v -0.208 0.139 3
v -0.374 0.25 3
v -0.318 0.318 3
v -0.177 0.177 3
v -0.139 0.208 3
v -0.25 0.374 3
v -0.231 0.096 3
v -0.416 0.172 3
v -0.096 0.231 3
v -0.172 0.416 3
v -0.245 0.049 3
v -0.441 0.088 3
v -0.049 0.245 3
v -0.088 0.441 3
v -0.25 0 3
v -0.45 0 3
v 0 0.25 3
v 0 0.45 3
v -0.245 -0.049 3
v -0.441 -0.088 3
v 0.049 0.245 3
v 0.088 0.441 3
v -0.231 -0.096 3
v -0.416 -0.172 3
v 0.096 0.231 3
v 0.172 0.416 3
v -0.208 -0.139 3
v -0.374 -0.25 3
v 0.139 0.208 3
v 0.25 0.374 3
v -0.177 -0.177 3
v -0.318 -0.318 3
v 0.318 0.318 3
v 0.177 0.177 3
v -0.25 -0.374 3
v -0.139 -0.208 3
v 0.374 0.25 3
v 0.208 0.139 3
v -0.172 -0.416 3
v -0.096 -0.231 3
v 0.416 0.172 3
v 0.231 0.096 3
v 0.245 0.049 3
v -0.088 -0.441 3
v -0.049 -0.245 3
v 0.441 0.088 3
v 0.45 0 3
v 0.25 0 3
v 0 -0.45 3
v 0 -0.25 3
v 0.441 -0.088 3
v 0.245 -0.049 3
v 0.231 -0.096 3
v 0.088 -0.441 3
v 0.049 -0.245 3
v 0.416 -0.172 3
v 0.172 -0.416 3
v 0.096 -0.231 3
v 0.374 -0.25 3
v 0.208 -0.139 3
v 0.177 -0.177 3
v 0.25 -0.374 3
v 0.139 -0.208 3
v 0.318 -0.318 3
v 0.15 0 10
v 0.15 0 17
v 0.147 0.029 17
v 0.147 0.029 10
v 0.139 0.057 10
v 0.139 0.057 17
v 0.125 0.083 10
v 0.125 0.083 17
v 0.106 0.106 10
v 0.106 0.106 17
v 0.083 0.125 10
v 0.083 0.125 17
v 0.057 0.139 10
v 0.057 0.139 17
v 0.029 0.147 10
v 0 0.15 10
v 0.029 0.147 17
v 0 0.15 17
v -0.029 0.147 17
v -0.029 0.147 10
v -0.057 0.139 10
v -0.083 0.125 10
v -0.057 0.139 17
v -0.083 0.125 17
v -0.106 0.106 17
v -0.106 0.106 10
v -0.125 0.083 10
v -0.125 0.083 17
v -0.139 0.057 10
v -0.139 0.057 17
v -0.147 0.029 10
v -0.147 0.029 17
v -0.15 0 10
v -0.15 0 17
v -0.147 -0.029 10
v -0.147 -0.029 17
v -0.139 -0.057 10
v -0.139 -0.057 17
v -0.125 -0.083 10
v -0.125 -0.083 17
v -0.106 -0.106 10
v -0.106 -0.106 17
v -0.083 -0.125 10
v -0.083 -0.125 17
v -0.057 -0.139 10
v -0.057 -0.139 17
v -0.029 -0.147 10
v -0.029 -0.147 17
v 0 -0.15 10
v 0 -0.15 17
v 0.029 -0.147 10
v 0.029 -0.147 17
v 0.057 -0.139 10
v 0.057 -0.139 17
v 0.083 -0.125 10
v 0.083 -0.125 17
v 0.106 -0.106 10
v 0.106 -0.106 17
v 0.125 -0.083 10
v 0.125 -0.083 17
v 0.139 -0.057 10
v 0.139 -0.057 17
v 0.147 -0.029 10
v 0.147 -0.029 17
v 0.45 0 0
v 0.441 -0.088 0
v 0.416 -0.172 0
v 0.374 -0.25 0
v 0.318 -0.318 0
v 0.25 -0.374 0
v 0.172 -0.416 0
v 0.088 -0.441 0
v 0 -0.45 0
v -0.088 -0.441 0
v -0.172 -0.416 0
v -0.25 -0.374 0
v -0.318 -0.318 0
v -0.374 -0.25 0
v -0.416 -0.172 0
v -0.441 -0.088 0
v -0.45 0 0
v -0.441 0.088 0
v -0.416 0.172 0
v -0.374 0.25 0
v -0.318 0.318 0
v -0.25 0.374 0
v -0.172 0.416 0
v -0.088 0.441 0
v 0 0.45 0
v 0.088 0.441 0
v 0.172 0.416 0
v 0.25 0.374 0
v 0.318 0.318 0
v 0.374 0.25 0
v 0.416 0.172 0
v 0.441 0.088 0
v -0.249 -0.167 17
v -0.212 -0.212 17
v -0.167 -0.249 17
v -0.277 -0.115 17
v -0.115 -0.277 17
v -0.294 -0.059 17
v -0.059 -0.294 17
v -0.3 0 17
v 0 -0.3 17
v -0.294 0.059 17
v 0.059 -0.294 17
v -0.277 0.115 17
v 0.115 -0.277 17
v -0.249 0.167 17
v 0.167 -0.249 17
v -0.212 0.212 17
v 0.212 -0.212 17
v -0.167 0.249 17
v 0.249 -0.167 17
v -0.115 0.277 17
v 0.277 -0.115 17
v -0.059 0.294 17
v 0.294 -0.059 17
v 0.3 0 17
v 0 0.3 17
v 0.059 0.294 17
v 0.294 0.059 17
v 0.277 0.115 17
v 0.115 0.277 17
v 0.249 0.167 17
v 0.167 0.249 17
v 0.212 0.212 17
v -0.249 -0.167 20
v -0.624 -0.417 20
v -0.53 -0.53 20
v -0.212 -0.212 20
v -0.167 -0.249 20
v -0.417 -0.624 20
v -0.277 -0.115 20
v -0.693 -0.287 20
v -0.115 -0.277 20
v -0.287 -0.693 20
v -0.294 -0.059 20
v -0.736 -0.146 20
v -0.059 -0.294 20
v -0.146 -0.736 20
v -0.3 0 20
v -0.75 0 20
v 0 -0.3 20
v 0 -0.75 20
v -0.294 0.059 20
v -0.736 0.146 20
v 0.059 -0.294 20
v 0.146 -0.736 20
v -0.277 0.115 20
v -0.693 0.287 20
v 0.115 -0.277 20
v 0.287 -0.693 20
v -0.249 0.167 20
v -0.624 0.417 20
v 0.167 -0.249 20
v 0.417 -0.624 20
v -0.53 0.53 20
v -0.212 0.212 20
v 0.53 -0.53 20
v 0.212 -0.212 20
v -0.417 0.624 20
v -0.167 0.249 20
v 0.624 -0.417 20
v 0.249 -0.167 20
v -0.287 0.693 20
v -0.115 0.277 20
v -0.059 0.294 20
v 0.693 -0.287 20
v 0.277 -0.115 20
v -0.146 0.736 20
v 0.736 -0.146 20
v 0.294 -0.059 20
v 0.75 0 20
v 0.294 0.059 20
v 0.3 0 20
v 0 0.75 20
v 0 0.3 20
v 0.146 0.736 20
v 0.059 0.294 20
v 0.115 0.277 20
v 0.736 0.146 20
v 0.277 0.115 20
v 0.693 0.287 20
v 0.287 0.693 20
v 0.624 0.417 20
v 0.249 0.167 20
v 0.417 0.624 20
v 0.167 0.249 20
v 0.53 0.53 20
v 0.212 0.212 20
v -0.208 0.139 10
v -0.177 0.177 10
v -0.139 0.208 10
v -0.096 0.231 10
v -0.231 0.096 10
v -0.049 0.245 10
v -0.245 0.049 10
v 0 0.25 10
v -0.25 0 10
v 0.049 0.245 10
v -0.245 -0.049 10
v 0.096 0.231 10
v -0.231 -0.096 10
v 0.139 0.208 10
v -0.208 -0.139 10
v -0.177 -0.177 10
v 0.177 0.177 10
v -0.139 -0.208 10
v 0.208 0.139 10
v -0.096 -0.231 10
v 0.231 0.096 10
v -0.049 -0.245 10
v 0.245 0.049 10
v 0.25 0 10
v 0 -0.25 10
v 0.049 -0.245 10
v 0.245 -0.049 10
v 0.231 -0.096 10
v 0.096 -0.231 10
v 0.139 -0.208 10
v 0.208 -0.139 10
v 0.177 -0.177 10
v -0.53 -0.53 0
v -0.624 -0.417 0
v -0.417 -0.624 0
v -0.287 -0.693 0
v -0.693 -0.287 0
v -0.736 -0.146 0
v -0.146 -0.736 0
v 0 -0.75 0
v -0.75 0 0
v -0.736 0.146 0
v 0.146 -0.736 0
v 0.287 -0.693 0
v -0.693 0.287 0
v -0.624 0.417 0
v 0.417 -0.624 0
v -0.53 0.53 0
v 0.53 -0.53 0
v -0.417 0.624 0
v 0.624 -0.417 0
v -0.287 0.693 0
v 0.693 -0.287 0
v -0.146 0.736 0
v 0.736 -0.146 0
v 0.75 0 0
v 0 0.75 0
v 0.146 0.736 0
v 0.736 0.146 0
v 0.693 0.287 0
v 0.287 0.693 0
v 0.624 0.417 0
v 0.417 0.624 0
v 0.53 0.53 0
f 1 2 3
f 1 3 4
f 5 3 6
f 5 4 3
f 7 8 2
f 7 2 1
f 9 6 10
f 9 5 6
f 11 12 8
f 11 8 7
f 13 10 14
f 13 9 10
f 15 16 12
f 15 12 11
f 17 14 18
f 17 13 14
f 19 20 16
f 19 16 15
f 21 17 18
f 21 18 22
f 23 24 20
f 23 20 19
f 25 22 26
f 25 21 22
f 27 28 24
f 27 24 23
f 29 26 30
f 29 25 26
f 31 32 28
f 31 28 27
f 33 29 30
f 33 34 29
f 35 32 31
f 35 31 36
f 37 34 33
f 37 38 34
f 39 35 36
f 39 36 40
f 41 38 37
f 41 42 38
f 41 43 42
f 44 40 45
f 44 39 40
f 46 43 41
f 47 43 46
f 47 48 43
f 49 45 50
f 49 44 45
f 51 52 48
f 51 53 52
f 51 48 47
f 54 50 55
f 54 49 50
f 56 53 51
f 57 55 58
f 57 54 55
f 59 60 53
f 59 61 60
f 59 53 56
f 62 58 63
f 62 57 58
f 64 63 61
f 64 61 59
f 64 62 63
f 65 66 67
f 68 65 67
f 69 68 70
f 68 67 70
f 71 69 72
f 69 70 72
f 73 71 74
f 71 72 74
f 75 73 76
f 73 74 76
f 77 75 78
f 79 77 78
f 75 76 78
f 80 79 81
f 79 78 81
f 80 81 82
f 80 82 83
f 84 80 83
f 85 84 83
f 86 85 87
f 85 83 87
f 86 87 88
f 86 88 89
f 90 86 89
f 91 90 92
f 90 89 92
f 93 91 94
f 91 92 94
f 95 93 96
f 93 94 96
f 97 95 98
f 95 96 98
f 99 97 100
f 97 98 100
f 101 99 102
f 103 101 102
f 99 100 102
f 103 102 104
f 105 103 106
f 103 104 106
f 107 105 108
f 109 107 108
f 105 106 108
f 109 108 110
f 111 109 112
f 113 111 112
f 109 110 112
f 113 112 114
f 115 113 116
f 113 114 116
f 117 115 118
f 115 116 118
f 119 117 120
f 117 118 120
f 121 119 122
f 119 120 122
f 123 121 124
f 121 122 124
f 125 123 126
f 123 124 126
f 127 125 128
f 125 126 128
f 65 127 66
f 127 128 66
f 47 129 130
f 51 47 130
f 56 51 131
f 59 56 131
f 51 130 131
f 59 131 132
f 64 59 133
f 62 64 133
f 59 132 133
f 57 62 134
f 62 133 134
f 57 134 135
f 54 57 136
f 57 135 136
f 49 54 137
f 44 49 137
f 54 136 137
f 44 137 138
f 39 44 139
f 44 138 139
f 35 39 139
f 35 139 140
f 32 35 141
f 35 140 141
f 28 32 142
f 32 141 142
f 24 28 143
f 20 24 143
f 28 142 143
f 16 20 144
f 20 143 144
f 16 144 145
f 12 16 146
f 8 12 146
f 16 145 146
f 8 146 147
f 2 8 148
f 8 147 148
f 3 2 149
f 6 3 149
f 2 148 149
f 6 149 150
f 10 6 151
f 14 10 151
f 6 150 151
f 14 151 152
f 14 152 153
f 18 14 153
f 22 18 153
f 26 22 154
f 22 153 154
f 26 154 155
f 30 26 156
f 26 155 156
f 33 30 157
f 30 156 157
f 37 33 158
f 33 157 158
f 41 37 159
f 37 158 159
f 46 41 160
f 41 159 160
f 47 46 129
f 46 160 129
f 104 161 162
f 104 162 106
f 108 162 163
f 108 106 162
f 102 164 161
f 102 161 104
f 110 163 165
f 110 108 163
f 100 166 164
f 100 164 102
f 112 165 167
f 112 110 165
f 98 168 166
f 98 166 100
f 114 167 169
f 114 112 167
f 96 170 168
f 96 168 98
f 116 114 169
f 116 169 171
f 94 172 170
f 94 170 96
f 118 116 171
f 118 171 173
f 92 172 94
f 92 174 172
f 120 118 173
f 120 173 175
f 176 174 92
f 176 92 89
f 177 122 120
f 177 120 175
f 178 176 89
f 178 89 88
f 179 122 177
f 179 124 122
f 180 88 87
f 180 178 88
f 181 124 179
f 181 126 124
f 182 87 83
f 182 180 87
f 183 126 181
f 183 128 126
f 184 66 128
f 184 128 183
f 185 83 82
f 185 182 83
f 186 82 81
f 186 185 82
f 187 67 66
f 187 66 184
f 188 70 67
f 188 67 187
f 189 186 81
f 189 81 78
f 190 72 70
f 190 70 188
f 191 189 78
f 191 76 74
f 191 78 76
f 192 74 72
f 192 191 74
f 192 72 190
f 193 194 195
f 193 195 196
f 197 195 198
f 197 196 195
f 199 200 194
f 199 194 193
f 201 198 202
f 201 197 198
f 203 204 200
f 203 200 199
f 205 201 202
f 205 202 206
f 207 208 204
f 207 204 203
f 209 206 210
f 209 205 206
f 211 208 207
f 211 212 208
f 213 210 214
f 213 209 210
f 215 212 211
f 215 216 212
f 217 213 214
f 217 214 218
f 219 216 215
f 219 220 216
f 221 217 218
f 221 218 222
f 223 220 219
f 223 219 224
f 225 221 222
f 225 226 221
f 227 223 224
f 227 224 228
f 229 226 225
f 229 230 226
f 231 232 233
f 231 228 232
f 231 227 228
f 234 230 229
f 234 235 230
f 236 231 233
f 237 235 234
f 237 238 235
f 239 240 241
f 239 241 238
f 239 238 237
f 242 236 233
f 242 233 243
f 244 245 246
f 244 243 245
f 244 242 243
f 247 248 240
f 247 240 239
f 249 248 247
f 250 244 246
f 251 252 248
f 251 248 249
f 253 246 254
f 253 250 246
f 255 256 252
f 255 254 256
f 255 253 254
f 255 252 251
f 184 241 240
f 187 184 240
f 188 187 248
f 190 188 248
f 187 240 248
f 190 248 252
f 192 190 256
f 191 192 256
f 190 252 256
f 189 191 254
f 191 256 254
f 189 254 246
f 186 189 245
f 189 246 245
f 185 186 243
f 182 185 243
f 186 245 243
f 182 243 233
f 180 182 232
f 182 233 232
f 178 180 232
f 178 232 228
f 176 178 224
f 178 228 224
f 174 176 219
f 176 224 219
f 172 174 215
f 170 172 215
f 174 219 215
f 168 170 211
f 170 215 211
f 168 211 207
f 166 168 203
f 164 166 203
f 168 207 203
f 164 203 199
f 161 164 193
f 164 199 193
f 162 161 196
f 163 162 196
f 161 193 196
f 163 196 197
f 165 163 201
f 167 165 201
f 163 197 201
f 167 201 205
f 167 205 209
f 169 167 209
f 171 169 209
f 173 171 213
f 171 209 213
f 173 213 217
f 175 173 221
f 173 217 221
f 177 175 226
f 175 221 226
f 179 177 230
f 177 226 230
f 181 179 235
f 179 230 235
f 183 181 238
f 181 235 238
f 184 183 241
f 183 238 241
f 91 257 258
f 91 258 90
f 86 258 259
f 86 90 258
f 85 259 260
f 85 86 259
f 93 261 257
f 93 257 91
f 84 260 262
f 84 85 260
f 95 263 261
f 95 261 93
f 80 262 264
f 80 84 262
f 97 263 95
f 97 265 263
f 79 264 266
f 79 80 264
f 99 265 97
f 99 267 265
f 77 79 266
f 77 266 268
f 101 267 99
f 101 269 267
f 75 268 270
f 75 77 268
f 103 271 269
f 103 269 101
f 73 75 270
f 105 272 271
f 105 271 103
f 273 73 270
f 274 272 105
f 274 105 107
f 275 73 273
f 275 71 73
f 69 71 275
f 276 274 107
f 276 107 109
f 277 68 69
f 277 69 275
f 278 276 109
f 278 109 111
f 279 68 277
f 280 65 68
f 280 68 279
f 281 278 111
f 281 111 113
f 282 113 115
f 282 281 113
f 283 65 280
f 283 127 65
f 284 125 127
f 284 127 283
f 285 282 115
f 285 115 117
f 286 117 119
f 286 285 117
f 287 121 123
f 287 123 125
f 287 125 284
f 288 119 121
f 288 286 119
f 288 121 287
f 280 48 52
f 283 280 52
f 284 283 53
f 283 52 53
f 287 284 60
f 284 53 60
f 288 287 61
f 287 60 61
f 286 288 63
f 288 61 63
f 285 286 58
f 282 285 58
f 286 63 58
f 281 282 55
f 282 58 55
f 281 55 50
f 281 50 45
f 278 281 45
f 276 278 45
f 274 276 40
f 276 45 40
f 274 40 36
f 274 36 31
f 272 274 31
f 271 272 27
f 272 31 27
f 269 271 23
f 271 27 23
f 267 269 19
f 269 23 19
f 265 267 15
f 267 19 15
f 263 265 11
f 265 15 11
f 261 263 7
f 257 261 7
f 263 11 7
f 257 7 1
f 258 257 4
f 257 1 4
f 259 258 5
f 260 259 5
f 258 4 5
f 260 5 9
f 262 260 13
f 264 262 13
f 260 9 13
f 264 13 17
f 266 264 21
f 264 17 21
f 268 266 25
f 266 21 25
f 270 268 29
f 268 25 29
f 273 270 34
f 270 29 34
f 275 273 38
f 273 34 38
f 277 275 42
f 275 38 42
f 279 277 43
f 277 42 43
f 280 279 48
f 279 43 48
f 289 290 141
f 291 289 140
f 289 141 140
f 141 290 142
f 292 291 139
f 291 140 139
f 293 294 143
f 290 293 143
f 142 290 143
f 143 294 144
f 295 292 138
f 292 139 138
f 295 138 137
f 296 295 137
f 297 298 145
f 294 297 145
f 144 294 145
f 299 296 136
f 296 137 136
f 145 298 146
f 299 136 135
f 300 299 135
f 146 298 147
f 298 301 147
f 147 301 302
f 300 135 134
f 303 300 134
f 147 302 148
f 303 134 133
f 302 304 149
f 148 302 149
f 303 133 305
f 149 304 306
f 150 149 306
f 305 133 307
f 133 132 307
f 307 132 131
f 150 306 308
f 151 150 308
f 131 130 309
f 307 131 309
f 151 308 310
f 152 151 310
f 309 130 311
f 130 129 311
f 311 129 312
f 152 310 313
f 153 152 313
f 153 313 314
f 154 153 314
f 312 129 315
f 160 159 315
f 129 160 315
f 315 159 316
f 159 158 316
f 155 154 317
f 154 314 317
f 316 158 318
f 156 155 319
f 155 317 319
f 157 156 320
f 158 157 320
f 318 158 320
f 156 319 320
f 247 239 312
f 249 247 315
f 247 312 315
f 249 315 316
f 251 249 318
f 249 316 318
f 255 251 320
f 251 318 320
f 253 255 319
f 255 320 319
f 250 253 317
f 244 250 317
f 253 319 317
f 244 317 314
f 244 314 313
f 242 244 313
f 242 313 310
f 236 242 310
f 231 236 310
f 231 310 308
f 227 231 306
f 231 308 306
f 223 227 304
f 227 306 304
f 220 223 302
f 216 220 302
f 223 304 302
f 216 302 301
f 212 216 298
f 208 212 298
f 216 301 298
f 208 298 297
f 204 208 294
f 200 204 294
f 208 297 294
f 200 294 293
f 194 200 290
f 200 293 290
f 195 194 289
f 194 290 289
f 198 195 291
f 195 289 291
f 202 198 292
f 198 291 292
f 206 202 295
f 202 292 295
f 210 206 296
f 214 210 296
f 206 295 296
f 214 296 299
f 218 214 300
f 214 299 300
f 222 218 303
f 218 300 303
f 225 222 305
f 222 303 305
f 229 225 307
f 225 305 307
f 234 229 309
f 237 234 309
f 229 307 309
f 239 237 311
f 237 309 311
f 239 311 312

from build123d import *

# Parameters (mm, degrees)
F0_R     = 0.75
F1_DEPTH = 20
F2_R     = 0.3
F3_DEPTH = 3
F4_R     = 0.15
F5_DEPTH = 7
F6_R     = 0.45
F7_DEPTH = 3
F8_R     = 0.25
F9_DEPTH = 7


with BuildPart() as f1:
    # F0 (on Top) → F1 (new body)
    with BuildSketch(Plane.XY):
        Circle(F0_R)
    extrude(amount=F1_DEPTH)

    # F2 (on face) → F3 (cut)
    with BuildSketch(Plane.XY.offset(20)):
        Circle(F2_R)
    extrude(amount=-F3_DEPTH, mode=Mode.SUBTRACT)

    # F4 (on face) → F5 (cut)
    with BuildSketch(Plane.XY.offset(17)):
        Circle(F4_R)
    extrude(amount=-F5_DEPTH, mode=Mode.SUBTRACT)

    # F6 (on face) → F7 (cut)
    with BuildSketch(Plane(origin=(0, 0, 0), x_dir=(1, 0, 0), z_dir=(0, 0, -1))):
        Circle(F6_R)
    extrude(amount=-F7_DEPTH, mode=Mode.SUBTRACT)

    # F8 (on face) → F9 (cut)
    with BuildSketch(Plane(origin=(0, 0, 3), x_dir=(1, 0, 0), z_dir=(0, 0, -1))):
        Circle(F8_R)
    extrude(amount=-F9_DEPTH, mode=Mode.SUBTRACT)


solid = f1.part
